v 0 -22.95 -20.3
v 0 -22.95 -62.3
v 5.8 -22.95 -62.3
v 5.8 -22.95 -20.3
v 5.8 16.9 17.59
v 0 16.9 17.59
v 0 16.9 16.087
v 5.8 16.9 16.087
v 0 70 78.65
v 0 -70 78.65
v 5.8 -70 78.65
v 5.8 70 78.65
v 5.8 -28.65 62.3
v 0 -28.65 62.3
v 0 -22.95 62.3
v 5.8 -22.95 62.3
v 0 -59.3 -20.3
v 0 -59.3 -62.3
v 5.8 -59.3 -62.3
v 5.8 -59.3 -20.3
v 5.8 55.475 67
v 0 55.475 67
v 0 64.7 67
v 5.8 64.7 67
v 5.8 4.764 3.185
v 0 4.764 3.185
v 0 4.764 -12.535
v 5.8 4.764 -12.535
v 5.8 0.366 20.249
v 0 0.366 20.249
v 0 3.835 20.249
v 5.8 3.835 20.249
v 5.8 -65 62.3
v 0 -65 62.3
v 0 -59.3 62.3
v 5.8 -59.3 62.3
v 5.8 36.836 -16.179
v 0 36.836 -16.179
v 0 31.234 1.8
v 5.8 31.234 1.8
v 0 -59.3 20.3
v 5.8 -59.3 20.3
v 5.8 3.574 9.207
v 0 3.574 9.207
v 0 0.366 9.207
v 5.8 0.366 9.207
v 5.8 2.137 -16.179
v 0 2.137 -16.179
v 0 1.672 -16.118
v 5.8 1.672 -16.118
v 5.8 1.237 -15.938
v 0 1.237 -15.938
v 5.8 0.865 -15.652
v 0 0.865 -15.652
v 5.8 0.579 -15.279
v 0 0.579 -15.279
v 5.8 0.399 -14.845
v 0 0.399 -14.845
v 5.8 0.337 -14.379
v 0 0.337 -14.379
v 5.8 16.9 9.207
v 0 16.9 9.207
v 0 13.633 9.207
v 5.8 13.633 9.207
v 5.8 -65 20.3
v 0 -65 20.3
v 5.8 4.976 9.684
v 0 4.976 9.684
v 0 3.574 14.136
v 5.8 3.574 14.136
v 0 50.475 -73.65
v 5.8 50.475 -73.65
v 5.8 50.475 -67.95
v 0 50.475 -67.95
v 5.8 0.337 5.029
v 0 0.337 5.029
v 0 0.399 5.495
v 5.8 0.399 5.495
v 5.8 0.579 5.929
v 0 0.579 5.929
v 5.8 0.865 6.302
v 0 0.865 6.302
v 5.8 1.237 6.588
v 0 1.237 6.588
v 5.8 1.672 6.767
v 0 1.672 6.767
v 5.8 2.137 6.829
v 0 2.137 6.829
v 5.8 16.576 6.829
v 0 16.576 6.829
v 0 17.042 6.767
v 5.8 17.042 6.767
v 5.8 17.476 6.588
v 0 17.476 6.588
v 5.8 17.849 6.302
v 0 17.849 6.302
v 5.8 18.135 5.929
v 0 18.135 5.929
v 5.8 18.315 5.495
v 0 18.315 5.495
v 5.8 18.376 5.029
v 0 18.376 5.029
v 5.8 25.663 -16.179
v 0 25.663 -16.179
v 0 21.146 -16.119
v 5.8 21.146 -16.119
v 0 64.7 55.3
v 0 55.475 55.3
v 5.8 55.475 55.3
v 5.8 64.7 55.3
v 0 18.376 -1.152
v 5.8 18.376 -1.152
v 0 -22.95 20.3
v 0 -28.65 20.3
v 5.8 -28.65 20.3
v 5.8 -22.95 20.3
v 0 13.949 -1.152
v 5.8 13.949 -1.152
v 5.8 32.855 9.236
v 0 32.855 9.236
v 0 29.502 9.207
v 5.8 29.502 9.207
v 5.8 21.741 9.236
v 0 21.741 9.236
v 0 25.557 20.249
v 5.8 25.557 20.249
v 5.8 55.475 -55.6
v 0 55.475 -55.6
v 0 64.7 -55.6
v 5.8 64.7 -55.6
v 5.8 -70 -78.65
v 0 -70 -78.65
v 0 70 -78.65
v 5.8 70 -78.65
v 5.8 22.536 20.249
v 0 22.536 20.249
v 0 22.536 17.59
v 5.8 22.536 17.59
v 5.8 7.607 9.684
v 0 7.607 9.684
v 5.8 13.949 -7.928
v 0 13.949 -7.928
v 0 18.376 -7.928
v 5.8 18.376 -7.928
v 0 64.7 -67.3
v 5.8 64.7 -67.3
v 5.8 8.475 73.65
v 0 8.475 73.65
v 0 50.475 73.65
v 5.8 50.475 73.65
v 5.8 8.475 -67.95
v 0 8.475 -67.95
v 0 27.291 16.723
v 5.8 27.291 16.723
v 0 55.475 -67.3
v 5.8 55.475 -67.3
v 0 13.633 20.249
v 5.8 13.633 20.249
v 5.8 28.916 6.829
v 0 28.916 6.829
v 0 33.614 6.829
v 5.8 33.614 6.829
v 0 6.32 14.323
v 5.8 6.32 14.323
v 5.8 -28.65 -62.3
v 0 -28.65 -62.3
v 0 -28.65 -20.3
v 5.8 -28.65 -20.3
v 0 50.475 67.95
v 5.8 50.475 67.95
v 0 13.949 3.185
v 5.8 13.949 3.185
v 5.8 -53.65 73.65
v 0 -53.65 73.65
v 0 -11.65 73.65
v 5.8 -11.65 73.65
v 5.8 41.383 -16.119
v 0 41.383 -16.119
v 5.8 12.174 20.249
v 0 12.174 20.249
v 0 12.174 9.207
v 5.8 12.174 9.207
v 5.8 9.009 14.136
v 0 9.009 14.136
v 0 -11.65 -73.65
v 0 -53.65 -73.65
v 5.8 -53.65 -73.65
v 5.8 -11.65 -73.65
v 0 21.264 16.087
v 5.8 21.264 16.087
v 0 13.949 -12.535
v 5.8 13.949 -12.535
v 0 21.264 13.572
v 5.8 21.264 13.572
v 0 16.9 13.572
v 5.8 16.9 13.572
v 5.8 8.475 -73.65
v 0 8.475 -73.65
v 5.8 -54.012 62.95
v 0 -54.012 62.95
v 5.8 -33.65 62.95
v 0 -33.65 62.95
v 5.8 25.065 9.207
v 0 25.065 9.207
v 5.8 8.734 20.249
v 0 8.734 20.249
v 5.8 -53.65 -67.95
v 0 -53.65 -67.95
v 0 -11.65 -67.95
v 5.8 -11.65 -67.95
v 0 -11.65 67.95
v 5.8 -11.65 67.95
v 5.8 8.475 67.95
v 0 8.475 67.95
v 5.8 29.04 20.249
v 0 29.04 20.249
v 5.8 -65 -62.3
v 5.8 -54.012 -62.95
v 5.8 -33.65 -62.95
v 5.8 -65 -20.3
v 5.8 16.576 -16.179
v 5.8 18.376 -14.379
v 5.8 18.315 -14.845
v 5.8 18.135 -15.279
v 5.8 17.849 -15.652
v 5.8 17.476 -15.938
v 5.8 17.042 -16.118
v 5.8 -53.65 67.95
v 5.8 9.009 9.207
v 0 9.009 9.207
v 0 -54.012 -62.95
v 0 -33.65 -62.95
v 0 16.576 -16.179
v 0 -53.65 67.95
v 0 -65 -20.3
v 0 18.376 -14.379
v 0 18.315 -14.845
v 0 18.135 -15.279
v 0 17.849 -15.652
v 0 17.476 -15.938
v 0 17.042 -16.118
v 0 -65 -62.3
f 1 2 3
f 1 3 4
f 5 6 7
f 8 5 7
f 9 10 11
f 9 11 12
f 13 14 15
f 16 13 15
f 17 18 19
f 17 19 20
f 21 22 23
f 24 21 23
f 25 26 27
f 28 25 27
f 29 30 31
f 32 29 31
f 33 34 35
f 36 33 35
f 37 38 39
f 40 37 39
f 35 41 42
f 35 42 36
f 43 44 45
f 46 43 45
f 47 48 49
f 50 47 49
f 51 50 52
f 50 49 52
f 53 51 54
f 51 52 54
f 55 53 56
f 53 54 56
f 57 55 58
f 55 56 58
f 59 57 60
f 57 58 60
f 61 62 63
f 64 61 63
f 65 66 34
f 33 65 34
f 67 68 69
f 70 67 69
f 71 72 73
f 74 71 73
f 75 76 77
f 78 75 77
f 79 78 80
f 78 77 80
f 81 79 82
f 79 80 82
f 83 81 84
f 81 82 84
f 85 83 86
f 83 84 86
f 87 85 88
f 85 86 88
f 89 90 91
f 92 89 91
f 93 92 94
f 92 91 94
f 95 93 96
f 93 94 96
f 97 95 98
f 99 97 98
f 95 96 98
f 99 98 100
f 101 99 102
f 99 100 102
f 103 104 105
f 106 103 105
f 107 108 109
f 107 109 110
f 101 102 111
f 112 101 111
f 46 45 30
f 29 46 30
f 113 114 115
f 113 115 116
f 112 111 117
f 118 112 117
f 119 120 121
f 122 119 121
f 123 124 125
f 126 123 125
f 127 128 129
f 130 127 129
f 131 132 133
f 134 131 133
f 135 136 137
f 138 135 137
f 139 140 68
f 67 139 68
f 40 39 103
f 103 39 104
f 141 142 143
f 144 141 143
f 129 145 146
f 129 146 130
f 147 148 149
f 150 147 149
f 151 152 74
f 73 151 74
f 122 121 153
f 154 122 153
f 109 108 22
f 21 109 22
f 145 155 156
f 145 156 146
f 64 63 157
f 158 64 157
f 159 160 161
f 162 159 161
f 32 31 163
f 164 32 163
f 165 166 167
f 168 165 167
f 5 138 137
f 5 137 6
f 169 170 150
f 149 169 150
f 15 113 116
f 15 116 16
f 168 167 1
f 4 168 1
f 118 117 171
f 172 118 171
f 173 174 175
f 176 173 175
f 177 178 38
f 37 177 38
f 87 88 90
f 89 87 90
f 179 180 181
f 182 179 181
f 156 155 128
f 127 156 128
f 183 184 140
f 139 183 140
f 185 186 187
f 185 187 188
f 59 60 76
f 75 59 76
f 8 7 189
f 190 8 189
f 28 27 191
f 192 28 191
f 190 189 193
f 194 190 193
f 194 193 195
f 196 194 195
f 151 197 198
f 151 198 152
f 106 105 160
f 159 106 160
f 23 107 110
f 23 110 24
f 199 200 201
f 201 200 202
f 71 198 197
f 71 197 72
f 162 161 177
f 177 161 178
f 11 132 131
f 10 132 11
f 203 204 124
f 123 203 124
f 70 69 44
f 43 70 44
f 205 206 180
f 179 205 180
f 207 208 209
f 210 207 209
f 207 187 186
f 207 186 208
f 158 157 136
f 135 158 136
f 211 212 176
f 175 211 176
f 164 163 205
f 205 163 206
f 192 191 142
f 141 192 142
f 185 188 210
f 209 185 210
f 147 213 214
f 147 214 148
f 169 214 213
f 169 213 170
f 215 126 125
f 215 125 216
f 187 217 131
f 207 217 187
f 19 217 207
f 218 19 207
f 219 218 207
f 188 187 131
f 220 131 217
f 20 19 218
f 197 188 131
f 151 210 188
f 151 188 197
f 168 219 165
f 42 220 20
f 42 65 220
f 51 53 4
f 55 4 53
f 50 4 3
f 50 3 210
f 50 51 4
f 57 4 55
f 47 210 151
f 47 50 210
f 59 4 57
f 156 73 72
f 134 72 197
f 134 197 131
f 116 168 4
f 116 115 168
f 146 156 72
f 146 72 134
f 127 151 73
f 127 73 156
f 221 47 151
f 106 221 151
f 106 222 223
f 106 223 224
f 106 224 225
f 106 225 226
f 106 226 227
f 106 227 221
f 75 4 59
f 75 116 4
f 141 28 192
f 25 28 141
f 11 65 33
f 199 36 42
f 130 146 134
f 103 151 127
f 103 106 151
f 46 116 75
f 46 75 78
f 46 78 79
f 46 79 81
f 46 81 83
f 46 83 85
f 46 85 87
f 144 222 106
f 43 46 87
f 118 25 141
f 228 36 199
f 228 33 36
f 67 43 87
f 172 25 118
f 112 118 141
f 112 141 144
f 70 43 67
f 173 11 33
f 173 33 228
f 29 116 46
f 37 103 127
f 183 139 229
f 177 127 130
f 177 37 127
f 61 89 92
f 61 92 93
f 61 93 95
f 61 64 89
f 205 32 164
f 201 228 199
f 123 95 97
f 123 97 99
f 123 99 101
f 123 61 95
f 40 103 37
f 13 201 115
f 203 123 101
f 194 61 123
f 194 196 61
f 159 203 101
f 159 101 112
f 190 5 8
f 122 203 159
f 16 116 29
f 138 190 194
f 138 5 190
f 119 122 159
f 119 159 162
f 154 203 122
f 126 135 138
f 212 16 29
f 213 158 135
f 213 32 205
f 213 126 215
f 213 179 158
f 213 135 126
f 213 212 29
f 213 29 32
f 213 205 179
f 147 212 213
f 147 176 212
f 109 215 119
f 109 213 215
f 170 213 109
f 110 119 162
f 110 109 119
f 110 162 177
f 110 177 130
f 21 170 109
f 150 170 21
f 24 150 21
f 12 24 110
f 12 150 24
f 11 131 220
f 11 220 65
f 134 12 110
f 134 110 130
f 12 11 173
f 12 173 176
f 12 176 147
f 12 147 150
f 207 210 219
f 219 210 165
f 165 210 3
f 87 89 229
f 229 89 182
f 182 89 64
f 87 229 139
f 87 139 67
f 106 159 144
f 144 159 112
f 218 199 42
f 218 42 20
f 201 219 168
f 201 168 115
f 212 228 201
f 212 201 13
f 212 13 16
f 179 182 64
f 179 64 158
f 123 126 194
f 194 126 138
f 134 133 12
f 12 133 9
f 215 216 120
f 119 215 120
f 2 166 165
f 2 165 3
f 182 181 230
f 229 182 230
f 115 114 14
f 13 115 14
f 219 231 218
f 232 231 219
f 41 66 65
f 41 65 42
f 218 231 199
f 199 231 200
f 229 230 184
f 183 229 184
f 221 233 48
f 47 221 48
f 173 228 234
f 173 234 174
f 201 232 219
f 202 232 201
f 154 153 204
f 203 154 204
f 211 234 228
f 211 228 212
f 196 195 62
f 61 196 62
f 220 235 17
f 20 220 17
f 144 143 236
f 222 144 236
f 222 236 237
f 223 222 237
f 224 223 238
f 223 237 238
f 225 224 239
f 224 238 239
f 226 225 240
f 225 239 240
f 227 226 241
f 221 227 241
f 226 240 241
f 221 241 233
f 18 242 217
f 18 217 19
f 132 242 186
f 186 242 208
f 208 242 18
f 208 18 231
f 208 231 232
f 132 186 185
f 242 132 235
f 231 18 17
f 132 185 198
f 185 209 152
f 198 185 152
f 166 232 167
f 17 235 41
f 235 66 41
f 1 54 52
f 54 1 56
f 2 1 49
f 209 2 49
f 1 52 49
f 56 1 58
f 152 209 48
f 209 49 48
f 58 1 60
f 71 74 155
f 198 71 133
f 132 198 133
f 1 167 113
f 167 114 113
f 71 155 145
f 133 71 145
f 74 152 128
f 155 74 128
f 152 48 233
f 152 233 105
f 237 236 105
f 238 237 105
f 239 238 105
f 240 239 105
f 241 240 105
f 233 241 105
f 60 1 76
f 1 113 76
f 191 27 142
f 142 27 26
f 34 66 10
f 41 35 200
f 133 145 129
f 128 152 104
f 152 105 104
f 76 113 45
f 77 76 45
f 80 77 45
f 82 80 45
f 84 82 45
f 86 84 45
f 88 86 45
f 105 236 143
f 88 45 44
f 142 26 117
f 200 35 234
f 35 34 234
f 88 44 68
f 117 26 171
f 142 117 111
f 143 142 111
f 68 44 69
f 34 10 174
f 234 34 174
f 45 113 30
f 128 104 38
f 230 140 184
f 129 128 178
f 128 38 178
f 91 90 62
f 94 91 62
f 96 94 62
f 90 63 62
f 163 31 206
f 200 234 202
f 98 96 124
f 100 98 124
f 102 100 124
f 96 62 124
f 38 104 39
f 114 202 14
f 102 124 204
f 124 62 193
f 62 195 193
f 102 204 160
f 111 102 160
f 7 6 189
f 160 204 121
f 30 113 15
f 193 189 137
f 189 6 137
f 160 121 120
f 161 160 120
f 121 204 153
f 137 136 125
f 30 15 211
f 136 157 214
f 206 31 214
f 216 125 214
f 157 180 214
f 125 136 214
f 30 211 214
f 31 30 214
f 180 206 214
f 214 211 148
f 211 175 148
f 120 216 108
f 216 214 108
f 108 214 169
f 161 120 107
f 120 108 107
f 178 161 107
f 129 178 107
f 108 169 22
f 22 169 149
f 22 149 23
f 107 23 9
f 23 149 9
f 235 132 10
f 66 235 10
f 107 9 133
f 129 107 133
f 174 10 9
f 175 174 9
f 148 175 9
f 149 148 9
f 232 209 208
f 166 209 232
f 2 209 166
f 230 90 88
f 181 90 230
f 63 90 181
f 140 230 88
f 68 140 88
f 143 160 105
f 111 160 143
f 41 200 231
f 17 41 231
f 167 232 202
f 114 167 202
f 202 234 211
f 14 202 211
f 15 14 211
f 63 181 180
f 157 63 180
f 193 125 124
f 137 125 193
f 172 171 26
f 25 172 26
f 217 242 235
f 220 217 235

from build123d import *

# Parameters (mm, degrees)
F0_W     = 140
F0_H     = 157.3
F0_W_2   = 5.7
F0_H_2   = 42
F0_W_3   = 42
F0_H_3   = 5.7
F0_W_4   = 9.225
F0_H_4   = 11.7
F0_W_5   = 20.361793
F0_H_5   = 125.9
F1_DEPTH = 5.8


with BuildPart() as f1:
    # F0 (on Right) → F1 (new body)
    with BuildSketch(Plane.YZ):
        Rectangle(F0_W, F0_H)
        with Locations((-62.15, -41.3)):
            Rectangle(F0_W_2, F0_H_2, mode=Mode.SUBTRACT)
        with Locations((-32.65, -70.8)):
            Rectangle(F0_W_3, F0_H_3, mode=Mode.SUBTRACT)
        with Locations((-25.8, -41.3)):
            Rectangle(F0_W_2, F0_H_2, mode=Mode.SUBTRACT)
        with Locations((29.475, -70.8)):
            Rectangle(F0_W_3, F0_H_3, mode=Mode.SUBTRACT)
        with Locations((60.0875, -61.45)):
            Rectangle(F0_W_4, F0_H_4, mode=Mode.SUBTRACT)
        with BuildLine():
            ThreePointArc((18.376166, -14.378899), (17.848958, -15.651691), (16.576166, -16.178899))
            Line((16.576166, -16.178899), (2.137455, -16.178901))
            ThreePointArc((2.137455, -16.178901), (0.864663, -15.651693), (0.337455, -14.378901))
            Line((0.337455, -14.378901), (0.337455, 5.028724))
            ThreePointArc((0.337455, 5.028724), (0.864663, 6.301516), (2.137455, 6.828724))
            Line((2.137455, 6.828724), (16.576166, 6.828722))
            ThreePointArc((16.576166, 6.828722), (17.848958, 6.301515), (18.376166, 5.028722))
            Line((18.376166, 5.028722), (18.376166, -1.151716))
            Line((18.376166, -1.151716), (13.94928, -1.151716))
            Line((13.94928, -1.151716), (13.94928, 3.184902))
            Line((13.94928, 3.184902), (4.764341, 3.184902))
            Line((4.764341, 3.184902), (4.764341, -12.535078))
            Line((4.764341, -12.535078), (13.94928, -12.535078))
            Line((13.94928, -12.535078), (13.94928, -7.927517))
            Line((13.94928, -7.927517), (18.376166, -7.927517))
            Line((18.376166, -7.927517), (18.376166, -14.378899))
        make_face(mode=Mode.SUBTRACT)
        Polygon((25.663247, -16.178899), (21.146094, -16.118674), (28.915746, 6.828724), (33.613575, 6.828724), (41.383157, -16.118674), (36.835821, -16.178899), (31.234478, 1.799588), align=None, mode=Mode.SUBTRACT)
        with Locations((-43.830896, 0)):
            Rectangle(F0_W_5, F0_H_5, mode=Mode.SUBTRACT)
        with Locations((-62.15, 41.3)):
            Rectangle(F0_W_2, F0_H_2, mode=Mode.SUBTRACT)
        with Locations((-25.8, 41.3)):
            Rectangle(F0_W_2, F0_H_2, mode=Mode.SUBTRACT)
        with Locations((-32.65, 70.8)):
            Rectangle(F0_W_3, F0_H_3, mode=Mode.SUBTRACT)
        Polygon((3.574371, 9.207119), (0.365742, 9.207119), (0.365742, 20.249205), (3.834504, 20.249205), (6.320433, 14.323433), (8.734065, 20.249205), (12.173907, 20.249205), (12.173907, 9.207119), (9.008657, 9.207119), (9.008657, 14.135599), (7.606707, 9.684005), (4.976251, 9.684005), (3.574371, 14.135599), align=None, mode=Mode.SUBTRACT)
        Polygon((16.899532, 13.571955), (16.899532, 9.207119), (13.633134, 9.207119), (13.633134, 20.249205), (22.536252, 20.249205), (22.536252, 17.589901), (16.899532, 17.589901), (16.899532, 16.086803), (21.264368, 16.086803), (21.264368, 13.571955), align=None, mode=Mode.SUBTRACT)
        Polygon((25.065139, 9.207119), (21.740973, 9.236038), (25.556555, 20.249205), (29.039706, 20.249205), (32.855358, 9.236038), (29.502273, 9.207119), (27.290936, 16.722745), align=None, mode=Mode.SUBTRACT)
        with Locations((29.475, 70.8)):
            Rectangle(F0_W_3, F0_H_3, mode=Mode.SUBTRACT)
        with Locations((60.0875, 61.15)):
            Rectangle(F0_W_4, F0_H_4, mode=Mode.SUBTRACT)
    extrude(amount=F1_DEPTH)


solid = f1.part
